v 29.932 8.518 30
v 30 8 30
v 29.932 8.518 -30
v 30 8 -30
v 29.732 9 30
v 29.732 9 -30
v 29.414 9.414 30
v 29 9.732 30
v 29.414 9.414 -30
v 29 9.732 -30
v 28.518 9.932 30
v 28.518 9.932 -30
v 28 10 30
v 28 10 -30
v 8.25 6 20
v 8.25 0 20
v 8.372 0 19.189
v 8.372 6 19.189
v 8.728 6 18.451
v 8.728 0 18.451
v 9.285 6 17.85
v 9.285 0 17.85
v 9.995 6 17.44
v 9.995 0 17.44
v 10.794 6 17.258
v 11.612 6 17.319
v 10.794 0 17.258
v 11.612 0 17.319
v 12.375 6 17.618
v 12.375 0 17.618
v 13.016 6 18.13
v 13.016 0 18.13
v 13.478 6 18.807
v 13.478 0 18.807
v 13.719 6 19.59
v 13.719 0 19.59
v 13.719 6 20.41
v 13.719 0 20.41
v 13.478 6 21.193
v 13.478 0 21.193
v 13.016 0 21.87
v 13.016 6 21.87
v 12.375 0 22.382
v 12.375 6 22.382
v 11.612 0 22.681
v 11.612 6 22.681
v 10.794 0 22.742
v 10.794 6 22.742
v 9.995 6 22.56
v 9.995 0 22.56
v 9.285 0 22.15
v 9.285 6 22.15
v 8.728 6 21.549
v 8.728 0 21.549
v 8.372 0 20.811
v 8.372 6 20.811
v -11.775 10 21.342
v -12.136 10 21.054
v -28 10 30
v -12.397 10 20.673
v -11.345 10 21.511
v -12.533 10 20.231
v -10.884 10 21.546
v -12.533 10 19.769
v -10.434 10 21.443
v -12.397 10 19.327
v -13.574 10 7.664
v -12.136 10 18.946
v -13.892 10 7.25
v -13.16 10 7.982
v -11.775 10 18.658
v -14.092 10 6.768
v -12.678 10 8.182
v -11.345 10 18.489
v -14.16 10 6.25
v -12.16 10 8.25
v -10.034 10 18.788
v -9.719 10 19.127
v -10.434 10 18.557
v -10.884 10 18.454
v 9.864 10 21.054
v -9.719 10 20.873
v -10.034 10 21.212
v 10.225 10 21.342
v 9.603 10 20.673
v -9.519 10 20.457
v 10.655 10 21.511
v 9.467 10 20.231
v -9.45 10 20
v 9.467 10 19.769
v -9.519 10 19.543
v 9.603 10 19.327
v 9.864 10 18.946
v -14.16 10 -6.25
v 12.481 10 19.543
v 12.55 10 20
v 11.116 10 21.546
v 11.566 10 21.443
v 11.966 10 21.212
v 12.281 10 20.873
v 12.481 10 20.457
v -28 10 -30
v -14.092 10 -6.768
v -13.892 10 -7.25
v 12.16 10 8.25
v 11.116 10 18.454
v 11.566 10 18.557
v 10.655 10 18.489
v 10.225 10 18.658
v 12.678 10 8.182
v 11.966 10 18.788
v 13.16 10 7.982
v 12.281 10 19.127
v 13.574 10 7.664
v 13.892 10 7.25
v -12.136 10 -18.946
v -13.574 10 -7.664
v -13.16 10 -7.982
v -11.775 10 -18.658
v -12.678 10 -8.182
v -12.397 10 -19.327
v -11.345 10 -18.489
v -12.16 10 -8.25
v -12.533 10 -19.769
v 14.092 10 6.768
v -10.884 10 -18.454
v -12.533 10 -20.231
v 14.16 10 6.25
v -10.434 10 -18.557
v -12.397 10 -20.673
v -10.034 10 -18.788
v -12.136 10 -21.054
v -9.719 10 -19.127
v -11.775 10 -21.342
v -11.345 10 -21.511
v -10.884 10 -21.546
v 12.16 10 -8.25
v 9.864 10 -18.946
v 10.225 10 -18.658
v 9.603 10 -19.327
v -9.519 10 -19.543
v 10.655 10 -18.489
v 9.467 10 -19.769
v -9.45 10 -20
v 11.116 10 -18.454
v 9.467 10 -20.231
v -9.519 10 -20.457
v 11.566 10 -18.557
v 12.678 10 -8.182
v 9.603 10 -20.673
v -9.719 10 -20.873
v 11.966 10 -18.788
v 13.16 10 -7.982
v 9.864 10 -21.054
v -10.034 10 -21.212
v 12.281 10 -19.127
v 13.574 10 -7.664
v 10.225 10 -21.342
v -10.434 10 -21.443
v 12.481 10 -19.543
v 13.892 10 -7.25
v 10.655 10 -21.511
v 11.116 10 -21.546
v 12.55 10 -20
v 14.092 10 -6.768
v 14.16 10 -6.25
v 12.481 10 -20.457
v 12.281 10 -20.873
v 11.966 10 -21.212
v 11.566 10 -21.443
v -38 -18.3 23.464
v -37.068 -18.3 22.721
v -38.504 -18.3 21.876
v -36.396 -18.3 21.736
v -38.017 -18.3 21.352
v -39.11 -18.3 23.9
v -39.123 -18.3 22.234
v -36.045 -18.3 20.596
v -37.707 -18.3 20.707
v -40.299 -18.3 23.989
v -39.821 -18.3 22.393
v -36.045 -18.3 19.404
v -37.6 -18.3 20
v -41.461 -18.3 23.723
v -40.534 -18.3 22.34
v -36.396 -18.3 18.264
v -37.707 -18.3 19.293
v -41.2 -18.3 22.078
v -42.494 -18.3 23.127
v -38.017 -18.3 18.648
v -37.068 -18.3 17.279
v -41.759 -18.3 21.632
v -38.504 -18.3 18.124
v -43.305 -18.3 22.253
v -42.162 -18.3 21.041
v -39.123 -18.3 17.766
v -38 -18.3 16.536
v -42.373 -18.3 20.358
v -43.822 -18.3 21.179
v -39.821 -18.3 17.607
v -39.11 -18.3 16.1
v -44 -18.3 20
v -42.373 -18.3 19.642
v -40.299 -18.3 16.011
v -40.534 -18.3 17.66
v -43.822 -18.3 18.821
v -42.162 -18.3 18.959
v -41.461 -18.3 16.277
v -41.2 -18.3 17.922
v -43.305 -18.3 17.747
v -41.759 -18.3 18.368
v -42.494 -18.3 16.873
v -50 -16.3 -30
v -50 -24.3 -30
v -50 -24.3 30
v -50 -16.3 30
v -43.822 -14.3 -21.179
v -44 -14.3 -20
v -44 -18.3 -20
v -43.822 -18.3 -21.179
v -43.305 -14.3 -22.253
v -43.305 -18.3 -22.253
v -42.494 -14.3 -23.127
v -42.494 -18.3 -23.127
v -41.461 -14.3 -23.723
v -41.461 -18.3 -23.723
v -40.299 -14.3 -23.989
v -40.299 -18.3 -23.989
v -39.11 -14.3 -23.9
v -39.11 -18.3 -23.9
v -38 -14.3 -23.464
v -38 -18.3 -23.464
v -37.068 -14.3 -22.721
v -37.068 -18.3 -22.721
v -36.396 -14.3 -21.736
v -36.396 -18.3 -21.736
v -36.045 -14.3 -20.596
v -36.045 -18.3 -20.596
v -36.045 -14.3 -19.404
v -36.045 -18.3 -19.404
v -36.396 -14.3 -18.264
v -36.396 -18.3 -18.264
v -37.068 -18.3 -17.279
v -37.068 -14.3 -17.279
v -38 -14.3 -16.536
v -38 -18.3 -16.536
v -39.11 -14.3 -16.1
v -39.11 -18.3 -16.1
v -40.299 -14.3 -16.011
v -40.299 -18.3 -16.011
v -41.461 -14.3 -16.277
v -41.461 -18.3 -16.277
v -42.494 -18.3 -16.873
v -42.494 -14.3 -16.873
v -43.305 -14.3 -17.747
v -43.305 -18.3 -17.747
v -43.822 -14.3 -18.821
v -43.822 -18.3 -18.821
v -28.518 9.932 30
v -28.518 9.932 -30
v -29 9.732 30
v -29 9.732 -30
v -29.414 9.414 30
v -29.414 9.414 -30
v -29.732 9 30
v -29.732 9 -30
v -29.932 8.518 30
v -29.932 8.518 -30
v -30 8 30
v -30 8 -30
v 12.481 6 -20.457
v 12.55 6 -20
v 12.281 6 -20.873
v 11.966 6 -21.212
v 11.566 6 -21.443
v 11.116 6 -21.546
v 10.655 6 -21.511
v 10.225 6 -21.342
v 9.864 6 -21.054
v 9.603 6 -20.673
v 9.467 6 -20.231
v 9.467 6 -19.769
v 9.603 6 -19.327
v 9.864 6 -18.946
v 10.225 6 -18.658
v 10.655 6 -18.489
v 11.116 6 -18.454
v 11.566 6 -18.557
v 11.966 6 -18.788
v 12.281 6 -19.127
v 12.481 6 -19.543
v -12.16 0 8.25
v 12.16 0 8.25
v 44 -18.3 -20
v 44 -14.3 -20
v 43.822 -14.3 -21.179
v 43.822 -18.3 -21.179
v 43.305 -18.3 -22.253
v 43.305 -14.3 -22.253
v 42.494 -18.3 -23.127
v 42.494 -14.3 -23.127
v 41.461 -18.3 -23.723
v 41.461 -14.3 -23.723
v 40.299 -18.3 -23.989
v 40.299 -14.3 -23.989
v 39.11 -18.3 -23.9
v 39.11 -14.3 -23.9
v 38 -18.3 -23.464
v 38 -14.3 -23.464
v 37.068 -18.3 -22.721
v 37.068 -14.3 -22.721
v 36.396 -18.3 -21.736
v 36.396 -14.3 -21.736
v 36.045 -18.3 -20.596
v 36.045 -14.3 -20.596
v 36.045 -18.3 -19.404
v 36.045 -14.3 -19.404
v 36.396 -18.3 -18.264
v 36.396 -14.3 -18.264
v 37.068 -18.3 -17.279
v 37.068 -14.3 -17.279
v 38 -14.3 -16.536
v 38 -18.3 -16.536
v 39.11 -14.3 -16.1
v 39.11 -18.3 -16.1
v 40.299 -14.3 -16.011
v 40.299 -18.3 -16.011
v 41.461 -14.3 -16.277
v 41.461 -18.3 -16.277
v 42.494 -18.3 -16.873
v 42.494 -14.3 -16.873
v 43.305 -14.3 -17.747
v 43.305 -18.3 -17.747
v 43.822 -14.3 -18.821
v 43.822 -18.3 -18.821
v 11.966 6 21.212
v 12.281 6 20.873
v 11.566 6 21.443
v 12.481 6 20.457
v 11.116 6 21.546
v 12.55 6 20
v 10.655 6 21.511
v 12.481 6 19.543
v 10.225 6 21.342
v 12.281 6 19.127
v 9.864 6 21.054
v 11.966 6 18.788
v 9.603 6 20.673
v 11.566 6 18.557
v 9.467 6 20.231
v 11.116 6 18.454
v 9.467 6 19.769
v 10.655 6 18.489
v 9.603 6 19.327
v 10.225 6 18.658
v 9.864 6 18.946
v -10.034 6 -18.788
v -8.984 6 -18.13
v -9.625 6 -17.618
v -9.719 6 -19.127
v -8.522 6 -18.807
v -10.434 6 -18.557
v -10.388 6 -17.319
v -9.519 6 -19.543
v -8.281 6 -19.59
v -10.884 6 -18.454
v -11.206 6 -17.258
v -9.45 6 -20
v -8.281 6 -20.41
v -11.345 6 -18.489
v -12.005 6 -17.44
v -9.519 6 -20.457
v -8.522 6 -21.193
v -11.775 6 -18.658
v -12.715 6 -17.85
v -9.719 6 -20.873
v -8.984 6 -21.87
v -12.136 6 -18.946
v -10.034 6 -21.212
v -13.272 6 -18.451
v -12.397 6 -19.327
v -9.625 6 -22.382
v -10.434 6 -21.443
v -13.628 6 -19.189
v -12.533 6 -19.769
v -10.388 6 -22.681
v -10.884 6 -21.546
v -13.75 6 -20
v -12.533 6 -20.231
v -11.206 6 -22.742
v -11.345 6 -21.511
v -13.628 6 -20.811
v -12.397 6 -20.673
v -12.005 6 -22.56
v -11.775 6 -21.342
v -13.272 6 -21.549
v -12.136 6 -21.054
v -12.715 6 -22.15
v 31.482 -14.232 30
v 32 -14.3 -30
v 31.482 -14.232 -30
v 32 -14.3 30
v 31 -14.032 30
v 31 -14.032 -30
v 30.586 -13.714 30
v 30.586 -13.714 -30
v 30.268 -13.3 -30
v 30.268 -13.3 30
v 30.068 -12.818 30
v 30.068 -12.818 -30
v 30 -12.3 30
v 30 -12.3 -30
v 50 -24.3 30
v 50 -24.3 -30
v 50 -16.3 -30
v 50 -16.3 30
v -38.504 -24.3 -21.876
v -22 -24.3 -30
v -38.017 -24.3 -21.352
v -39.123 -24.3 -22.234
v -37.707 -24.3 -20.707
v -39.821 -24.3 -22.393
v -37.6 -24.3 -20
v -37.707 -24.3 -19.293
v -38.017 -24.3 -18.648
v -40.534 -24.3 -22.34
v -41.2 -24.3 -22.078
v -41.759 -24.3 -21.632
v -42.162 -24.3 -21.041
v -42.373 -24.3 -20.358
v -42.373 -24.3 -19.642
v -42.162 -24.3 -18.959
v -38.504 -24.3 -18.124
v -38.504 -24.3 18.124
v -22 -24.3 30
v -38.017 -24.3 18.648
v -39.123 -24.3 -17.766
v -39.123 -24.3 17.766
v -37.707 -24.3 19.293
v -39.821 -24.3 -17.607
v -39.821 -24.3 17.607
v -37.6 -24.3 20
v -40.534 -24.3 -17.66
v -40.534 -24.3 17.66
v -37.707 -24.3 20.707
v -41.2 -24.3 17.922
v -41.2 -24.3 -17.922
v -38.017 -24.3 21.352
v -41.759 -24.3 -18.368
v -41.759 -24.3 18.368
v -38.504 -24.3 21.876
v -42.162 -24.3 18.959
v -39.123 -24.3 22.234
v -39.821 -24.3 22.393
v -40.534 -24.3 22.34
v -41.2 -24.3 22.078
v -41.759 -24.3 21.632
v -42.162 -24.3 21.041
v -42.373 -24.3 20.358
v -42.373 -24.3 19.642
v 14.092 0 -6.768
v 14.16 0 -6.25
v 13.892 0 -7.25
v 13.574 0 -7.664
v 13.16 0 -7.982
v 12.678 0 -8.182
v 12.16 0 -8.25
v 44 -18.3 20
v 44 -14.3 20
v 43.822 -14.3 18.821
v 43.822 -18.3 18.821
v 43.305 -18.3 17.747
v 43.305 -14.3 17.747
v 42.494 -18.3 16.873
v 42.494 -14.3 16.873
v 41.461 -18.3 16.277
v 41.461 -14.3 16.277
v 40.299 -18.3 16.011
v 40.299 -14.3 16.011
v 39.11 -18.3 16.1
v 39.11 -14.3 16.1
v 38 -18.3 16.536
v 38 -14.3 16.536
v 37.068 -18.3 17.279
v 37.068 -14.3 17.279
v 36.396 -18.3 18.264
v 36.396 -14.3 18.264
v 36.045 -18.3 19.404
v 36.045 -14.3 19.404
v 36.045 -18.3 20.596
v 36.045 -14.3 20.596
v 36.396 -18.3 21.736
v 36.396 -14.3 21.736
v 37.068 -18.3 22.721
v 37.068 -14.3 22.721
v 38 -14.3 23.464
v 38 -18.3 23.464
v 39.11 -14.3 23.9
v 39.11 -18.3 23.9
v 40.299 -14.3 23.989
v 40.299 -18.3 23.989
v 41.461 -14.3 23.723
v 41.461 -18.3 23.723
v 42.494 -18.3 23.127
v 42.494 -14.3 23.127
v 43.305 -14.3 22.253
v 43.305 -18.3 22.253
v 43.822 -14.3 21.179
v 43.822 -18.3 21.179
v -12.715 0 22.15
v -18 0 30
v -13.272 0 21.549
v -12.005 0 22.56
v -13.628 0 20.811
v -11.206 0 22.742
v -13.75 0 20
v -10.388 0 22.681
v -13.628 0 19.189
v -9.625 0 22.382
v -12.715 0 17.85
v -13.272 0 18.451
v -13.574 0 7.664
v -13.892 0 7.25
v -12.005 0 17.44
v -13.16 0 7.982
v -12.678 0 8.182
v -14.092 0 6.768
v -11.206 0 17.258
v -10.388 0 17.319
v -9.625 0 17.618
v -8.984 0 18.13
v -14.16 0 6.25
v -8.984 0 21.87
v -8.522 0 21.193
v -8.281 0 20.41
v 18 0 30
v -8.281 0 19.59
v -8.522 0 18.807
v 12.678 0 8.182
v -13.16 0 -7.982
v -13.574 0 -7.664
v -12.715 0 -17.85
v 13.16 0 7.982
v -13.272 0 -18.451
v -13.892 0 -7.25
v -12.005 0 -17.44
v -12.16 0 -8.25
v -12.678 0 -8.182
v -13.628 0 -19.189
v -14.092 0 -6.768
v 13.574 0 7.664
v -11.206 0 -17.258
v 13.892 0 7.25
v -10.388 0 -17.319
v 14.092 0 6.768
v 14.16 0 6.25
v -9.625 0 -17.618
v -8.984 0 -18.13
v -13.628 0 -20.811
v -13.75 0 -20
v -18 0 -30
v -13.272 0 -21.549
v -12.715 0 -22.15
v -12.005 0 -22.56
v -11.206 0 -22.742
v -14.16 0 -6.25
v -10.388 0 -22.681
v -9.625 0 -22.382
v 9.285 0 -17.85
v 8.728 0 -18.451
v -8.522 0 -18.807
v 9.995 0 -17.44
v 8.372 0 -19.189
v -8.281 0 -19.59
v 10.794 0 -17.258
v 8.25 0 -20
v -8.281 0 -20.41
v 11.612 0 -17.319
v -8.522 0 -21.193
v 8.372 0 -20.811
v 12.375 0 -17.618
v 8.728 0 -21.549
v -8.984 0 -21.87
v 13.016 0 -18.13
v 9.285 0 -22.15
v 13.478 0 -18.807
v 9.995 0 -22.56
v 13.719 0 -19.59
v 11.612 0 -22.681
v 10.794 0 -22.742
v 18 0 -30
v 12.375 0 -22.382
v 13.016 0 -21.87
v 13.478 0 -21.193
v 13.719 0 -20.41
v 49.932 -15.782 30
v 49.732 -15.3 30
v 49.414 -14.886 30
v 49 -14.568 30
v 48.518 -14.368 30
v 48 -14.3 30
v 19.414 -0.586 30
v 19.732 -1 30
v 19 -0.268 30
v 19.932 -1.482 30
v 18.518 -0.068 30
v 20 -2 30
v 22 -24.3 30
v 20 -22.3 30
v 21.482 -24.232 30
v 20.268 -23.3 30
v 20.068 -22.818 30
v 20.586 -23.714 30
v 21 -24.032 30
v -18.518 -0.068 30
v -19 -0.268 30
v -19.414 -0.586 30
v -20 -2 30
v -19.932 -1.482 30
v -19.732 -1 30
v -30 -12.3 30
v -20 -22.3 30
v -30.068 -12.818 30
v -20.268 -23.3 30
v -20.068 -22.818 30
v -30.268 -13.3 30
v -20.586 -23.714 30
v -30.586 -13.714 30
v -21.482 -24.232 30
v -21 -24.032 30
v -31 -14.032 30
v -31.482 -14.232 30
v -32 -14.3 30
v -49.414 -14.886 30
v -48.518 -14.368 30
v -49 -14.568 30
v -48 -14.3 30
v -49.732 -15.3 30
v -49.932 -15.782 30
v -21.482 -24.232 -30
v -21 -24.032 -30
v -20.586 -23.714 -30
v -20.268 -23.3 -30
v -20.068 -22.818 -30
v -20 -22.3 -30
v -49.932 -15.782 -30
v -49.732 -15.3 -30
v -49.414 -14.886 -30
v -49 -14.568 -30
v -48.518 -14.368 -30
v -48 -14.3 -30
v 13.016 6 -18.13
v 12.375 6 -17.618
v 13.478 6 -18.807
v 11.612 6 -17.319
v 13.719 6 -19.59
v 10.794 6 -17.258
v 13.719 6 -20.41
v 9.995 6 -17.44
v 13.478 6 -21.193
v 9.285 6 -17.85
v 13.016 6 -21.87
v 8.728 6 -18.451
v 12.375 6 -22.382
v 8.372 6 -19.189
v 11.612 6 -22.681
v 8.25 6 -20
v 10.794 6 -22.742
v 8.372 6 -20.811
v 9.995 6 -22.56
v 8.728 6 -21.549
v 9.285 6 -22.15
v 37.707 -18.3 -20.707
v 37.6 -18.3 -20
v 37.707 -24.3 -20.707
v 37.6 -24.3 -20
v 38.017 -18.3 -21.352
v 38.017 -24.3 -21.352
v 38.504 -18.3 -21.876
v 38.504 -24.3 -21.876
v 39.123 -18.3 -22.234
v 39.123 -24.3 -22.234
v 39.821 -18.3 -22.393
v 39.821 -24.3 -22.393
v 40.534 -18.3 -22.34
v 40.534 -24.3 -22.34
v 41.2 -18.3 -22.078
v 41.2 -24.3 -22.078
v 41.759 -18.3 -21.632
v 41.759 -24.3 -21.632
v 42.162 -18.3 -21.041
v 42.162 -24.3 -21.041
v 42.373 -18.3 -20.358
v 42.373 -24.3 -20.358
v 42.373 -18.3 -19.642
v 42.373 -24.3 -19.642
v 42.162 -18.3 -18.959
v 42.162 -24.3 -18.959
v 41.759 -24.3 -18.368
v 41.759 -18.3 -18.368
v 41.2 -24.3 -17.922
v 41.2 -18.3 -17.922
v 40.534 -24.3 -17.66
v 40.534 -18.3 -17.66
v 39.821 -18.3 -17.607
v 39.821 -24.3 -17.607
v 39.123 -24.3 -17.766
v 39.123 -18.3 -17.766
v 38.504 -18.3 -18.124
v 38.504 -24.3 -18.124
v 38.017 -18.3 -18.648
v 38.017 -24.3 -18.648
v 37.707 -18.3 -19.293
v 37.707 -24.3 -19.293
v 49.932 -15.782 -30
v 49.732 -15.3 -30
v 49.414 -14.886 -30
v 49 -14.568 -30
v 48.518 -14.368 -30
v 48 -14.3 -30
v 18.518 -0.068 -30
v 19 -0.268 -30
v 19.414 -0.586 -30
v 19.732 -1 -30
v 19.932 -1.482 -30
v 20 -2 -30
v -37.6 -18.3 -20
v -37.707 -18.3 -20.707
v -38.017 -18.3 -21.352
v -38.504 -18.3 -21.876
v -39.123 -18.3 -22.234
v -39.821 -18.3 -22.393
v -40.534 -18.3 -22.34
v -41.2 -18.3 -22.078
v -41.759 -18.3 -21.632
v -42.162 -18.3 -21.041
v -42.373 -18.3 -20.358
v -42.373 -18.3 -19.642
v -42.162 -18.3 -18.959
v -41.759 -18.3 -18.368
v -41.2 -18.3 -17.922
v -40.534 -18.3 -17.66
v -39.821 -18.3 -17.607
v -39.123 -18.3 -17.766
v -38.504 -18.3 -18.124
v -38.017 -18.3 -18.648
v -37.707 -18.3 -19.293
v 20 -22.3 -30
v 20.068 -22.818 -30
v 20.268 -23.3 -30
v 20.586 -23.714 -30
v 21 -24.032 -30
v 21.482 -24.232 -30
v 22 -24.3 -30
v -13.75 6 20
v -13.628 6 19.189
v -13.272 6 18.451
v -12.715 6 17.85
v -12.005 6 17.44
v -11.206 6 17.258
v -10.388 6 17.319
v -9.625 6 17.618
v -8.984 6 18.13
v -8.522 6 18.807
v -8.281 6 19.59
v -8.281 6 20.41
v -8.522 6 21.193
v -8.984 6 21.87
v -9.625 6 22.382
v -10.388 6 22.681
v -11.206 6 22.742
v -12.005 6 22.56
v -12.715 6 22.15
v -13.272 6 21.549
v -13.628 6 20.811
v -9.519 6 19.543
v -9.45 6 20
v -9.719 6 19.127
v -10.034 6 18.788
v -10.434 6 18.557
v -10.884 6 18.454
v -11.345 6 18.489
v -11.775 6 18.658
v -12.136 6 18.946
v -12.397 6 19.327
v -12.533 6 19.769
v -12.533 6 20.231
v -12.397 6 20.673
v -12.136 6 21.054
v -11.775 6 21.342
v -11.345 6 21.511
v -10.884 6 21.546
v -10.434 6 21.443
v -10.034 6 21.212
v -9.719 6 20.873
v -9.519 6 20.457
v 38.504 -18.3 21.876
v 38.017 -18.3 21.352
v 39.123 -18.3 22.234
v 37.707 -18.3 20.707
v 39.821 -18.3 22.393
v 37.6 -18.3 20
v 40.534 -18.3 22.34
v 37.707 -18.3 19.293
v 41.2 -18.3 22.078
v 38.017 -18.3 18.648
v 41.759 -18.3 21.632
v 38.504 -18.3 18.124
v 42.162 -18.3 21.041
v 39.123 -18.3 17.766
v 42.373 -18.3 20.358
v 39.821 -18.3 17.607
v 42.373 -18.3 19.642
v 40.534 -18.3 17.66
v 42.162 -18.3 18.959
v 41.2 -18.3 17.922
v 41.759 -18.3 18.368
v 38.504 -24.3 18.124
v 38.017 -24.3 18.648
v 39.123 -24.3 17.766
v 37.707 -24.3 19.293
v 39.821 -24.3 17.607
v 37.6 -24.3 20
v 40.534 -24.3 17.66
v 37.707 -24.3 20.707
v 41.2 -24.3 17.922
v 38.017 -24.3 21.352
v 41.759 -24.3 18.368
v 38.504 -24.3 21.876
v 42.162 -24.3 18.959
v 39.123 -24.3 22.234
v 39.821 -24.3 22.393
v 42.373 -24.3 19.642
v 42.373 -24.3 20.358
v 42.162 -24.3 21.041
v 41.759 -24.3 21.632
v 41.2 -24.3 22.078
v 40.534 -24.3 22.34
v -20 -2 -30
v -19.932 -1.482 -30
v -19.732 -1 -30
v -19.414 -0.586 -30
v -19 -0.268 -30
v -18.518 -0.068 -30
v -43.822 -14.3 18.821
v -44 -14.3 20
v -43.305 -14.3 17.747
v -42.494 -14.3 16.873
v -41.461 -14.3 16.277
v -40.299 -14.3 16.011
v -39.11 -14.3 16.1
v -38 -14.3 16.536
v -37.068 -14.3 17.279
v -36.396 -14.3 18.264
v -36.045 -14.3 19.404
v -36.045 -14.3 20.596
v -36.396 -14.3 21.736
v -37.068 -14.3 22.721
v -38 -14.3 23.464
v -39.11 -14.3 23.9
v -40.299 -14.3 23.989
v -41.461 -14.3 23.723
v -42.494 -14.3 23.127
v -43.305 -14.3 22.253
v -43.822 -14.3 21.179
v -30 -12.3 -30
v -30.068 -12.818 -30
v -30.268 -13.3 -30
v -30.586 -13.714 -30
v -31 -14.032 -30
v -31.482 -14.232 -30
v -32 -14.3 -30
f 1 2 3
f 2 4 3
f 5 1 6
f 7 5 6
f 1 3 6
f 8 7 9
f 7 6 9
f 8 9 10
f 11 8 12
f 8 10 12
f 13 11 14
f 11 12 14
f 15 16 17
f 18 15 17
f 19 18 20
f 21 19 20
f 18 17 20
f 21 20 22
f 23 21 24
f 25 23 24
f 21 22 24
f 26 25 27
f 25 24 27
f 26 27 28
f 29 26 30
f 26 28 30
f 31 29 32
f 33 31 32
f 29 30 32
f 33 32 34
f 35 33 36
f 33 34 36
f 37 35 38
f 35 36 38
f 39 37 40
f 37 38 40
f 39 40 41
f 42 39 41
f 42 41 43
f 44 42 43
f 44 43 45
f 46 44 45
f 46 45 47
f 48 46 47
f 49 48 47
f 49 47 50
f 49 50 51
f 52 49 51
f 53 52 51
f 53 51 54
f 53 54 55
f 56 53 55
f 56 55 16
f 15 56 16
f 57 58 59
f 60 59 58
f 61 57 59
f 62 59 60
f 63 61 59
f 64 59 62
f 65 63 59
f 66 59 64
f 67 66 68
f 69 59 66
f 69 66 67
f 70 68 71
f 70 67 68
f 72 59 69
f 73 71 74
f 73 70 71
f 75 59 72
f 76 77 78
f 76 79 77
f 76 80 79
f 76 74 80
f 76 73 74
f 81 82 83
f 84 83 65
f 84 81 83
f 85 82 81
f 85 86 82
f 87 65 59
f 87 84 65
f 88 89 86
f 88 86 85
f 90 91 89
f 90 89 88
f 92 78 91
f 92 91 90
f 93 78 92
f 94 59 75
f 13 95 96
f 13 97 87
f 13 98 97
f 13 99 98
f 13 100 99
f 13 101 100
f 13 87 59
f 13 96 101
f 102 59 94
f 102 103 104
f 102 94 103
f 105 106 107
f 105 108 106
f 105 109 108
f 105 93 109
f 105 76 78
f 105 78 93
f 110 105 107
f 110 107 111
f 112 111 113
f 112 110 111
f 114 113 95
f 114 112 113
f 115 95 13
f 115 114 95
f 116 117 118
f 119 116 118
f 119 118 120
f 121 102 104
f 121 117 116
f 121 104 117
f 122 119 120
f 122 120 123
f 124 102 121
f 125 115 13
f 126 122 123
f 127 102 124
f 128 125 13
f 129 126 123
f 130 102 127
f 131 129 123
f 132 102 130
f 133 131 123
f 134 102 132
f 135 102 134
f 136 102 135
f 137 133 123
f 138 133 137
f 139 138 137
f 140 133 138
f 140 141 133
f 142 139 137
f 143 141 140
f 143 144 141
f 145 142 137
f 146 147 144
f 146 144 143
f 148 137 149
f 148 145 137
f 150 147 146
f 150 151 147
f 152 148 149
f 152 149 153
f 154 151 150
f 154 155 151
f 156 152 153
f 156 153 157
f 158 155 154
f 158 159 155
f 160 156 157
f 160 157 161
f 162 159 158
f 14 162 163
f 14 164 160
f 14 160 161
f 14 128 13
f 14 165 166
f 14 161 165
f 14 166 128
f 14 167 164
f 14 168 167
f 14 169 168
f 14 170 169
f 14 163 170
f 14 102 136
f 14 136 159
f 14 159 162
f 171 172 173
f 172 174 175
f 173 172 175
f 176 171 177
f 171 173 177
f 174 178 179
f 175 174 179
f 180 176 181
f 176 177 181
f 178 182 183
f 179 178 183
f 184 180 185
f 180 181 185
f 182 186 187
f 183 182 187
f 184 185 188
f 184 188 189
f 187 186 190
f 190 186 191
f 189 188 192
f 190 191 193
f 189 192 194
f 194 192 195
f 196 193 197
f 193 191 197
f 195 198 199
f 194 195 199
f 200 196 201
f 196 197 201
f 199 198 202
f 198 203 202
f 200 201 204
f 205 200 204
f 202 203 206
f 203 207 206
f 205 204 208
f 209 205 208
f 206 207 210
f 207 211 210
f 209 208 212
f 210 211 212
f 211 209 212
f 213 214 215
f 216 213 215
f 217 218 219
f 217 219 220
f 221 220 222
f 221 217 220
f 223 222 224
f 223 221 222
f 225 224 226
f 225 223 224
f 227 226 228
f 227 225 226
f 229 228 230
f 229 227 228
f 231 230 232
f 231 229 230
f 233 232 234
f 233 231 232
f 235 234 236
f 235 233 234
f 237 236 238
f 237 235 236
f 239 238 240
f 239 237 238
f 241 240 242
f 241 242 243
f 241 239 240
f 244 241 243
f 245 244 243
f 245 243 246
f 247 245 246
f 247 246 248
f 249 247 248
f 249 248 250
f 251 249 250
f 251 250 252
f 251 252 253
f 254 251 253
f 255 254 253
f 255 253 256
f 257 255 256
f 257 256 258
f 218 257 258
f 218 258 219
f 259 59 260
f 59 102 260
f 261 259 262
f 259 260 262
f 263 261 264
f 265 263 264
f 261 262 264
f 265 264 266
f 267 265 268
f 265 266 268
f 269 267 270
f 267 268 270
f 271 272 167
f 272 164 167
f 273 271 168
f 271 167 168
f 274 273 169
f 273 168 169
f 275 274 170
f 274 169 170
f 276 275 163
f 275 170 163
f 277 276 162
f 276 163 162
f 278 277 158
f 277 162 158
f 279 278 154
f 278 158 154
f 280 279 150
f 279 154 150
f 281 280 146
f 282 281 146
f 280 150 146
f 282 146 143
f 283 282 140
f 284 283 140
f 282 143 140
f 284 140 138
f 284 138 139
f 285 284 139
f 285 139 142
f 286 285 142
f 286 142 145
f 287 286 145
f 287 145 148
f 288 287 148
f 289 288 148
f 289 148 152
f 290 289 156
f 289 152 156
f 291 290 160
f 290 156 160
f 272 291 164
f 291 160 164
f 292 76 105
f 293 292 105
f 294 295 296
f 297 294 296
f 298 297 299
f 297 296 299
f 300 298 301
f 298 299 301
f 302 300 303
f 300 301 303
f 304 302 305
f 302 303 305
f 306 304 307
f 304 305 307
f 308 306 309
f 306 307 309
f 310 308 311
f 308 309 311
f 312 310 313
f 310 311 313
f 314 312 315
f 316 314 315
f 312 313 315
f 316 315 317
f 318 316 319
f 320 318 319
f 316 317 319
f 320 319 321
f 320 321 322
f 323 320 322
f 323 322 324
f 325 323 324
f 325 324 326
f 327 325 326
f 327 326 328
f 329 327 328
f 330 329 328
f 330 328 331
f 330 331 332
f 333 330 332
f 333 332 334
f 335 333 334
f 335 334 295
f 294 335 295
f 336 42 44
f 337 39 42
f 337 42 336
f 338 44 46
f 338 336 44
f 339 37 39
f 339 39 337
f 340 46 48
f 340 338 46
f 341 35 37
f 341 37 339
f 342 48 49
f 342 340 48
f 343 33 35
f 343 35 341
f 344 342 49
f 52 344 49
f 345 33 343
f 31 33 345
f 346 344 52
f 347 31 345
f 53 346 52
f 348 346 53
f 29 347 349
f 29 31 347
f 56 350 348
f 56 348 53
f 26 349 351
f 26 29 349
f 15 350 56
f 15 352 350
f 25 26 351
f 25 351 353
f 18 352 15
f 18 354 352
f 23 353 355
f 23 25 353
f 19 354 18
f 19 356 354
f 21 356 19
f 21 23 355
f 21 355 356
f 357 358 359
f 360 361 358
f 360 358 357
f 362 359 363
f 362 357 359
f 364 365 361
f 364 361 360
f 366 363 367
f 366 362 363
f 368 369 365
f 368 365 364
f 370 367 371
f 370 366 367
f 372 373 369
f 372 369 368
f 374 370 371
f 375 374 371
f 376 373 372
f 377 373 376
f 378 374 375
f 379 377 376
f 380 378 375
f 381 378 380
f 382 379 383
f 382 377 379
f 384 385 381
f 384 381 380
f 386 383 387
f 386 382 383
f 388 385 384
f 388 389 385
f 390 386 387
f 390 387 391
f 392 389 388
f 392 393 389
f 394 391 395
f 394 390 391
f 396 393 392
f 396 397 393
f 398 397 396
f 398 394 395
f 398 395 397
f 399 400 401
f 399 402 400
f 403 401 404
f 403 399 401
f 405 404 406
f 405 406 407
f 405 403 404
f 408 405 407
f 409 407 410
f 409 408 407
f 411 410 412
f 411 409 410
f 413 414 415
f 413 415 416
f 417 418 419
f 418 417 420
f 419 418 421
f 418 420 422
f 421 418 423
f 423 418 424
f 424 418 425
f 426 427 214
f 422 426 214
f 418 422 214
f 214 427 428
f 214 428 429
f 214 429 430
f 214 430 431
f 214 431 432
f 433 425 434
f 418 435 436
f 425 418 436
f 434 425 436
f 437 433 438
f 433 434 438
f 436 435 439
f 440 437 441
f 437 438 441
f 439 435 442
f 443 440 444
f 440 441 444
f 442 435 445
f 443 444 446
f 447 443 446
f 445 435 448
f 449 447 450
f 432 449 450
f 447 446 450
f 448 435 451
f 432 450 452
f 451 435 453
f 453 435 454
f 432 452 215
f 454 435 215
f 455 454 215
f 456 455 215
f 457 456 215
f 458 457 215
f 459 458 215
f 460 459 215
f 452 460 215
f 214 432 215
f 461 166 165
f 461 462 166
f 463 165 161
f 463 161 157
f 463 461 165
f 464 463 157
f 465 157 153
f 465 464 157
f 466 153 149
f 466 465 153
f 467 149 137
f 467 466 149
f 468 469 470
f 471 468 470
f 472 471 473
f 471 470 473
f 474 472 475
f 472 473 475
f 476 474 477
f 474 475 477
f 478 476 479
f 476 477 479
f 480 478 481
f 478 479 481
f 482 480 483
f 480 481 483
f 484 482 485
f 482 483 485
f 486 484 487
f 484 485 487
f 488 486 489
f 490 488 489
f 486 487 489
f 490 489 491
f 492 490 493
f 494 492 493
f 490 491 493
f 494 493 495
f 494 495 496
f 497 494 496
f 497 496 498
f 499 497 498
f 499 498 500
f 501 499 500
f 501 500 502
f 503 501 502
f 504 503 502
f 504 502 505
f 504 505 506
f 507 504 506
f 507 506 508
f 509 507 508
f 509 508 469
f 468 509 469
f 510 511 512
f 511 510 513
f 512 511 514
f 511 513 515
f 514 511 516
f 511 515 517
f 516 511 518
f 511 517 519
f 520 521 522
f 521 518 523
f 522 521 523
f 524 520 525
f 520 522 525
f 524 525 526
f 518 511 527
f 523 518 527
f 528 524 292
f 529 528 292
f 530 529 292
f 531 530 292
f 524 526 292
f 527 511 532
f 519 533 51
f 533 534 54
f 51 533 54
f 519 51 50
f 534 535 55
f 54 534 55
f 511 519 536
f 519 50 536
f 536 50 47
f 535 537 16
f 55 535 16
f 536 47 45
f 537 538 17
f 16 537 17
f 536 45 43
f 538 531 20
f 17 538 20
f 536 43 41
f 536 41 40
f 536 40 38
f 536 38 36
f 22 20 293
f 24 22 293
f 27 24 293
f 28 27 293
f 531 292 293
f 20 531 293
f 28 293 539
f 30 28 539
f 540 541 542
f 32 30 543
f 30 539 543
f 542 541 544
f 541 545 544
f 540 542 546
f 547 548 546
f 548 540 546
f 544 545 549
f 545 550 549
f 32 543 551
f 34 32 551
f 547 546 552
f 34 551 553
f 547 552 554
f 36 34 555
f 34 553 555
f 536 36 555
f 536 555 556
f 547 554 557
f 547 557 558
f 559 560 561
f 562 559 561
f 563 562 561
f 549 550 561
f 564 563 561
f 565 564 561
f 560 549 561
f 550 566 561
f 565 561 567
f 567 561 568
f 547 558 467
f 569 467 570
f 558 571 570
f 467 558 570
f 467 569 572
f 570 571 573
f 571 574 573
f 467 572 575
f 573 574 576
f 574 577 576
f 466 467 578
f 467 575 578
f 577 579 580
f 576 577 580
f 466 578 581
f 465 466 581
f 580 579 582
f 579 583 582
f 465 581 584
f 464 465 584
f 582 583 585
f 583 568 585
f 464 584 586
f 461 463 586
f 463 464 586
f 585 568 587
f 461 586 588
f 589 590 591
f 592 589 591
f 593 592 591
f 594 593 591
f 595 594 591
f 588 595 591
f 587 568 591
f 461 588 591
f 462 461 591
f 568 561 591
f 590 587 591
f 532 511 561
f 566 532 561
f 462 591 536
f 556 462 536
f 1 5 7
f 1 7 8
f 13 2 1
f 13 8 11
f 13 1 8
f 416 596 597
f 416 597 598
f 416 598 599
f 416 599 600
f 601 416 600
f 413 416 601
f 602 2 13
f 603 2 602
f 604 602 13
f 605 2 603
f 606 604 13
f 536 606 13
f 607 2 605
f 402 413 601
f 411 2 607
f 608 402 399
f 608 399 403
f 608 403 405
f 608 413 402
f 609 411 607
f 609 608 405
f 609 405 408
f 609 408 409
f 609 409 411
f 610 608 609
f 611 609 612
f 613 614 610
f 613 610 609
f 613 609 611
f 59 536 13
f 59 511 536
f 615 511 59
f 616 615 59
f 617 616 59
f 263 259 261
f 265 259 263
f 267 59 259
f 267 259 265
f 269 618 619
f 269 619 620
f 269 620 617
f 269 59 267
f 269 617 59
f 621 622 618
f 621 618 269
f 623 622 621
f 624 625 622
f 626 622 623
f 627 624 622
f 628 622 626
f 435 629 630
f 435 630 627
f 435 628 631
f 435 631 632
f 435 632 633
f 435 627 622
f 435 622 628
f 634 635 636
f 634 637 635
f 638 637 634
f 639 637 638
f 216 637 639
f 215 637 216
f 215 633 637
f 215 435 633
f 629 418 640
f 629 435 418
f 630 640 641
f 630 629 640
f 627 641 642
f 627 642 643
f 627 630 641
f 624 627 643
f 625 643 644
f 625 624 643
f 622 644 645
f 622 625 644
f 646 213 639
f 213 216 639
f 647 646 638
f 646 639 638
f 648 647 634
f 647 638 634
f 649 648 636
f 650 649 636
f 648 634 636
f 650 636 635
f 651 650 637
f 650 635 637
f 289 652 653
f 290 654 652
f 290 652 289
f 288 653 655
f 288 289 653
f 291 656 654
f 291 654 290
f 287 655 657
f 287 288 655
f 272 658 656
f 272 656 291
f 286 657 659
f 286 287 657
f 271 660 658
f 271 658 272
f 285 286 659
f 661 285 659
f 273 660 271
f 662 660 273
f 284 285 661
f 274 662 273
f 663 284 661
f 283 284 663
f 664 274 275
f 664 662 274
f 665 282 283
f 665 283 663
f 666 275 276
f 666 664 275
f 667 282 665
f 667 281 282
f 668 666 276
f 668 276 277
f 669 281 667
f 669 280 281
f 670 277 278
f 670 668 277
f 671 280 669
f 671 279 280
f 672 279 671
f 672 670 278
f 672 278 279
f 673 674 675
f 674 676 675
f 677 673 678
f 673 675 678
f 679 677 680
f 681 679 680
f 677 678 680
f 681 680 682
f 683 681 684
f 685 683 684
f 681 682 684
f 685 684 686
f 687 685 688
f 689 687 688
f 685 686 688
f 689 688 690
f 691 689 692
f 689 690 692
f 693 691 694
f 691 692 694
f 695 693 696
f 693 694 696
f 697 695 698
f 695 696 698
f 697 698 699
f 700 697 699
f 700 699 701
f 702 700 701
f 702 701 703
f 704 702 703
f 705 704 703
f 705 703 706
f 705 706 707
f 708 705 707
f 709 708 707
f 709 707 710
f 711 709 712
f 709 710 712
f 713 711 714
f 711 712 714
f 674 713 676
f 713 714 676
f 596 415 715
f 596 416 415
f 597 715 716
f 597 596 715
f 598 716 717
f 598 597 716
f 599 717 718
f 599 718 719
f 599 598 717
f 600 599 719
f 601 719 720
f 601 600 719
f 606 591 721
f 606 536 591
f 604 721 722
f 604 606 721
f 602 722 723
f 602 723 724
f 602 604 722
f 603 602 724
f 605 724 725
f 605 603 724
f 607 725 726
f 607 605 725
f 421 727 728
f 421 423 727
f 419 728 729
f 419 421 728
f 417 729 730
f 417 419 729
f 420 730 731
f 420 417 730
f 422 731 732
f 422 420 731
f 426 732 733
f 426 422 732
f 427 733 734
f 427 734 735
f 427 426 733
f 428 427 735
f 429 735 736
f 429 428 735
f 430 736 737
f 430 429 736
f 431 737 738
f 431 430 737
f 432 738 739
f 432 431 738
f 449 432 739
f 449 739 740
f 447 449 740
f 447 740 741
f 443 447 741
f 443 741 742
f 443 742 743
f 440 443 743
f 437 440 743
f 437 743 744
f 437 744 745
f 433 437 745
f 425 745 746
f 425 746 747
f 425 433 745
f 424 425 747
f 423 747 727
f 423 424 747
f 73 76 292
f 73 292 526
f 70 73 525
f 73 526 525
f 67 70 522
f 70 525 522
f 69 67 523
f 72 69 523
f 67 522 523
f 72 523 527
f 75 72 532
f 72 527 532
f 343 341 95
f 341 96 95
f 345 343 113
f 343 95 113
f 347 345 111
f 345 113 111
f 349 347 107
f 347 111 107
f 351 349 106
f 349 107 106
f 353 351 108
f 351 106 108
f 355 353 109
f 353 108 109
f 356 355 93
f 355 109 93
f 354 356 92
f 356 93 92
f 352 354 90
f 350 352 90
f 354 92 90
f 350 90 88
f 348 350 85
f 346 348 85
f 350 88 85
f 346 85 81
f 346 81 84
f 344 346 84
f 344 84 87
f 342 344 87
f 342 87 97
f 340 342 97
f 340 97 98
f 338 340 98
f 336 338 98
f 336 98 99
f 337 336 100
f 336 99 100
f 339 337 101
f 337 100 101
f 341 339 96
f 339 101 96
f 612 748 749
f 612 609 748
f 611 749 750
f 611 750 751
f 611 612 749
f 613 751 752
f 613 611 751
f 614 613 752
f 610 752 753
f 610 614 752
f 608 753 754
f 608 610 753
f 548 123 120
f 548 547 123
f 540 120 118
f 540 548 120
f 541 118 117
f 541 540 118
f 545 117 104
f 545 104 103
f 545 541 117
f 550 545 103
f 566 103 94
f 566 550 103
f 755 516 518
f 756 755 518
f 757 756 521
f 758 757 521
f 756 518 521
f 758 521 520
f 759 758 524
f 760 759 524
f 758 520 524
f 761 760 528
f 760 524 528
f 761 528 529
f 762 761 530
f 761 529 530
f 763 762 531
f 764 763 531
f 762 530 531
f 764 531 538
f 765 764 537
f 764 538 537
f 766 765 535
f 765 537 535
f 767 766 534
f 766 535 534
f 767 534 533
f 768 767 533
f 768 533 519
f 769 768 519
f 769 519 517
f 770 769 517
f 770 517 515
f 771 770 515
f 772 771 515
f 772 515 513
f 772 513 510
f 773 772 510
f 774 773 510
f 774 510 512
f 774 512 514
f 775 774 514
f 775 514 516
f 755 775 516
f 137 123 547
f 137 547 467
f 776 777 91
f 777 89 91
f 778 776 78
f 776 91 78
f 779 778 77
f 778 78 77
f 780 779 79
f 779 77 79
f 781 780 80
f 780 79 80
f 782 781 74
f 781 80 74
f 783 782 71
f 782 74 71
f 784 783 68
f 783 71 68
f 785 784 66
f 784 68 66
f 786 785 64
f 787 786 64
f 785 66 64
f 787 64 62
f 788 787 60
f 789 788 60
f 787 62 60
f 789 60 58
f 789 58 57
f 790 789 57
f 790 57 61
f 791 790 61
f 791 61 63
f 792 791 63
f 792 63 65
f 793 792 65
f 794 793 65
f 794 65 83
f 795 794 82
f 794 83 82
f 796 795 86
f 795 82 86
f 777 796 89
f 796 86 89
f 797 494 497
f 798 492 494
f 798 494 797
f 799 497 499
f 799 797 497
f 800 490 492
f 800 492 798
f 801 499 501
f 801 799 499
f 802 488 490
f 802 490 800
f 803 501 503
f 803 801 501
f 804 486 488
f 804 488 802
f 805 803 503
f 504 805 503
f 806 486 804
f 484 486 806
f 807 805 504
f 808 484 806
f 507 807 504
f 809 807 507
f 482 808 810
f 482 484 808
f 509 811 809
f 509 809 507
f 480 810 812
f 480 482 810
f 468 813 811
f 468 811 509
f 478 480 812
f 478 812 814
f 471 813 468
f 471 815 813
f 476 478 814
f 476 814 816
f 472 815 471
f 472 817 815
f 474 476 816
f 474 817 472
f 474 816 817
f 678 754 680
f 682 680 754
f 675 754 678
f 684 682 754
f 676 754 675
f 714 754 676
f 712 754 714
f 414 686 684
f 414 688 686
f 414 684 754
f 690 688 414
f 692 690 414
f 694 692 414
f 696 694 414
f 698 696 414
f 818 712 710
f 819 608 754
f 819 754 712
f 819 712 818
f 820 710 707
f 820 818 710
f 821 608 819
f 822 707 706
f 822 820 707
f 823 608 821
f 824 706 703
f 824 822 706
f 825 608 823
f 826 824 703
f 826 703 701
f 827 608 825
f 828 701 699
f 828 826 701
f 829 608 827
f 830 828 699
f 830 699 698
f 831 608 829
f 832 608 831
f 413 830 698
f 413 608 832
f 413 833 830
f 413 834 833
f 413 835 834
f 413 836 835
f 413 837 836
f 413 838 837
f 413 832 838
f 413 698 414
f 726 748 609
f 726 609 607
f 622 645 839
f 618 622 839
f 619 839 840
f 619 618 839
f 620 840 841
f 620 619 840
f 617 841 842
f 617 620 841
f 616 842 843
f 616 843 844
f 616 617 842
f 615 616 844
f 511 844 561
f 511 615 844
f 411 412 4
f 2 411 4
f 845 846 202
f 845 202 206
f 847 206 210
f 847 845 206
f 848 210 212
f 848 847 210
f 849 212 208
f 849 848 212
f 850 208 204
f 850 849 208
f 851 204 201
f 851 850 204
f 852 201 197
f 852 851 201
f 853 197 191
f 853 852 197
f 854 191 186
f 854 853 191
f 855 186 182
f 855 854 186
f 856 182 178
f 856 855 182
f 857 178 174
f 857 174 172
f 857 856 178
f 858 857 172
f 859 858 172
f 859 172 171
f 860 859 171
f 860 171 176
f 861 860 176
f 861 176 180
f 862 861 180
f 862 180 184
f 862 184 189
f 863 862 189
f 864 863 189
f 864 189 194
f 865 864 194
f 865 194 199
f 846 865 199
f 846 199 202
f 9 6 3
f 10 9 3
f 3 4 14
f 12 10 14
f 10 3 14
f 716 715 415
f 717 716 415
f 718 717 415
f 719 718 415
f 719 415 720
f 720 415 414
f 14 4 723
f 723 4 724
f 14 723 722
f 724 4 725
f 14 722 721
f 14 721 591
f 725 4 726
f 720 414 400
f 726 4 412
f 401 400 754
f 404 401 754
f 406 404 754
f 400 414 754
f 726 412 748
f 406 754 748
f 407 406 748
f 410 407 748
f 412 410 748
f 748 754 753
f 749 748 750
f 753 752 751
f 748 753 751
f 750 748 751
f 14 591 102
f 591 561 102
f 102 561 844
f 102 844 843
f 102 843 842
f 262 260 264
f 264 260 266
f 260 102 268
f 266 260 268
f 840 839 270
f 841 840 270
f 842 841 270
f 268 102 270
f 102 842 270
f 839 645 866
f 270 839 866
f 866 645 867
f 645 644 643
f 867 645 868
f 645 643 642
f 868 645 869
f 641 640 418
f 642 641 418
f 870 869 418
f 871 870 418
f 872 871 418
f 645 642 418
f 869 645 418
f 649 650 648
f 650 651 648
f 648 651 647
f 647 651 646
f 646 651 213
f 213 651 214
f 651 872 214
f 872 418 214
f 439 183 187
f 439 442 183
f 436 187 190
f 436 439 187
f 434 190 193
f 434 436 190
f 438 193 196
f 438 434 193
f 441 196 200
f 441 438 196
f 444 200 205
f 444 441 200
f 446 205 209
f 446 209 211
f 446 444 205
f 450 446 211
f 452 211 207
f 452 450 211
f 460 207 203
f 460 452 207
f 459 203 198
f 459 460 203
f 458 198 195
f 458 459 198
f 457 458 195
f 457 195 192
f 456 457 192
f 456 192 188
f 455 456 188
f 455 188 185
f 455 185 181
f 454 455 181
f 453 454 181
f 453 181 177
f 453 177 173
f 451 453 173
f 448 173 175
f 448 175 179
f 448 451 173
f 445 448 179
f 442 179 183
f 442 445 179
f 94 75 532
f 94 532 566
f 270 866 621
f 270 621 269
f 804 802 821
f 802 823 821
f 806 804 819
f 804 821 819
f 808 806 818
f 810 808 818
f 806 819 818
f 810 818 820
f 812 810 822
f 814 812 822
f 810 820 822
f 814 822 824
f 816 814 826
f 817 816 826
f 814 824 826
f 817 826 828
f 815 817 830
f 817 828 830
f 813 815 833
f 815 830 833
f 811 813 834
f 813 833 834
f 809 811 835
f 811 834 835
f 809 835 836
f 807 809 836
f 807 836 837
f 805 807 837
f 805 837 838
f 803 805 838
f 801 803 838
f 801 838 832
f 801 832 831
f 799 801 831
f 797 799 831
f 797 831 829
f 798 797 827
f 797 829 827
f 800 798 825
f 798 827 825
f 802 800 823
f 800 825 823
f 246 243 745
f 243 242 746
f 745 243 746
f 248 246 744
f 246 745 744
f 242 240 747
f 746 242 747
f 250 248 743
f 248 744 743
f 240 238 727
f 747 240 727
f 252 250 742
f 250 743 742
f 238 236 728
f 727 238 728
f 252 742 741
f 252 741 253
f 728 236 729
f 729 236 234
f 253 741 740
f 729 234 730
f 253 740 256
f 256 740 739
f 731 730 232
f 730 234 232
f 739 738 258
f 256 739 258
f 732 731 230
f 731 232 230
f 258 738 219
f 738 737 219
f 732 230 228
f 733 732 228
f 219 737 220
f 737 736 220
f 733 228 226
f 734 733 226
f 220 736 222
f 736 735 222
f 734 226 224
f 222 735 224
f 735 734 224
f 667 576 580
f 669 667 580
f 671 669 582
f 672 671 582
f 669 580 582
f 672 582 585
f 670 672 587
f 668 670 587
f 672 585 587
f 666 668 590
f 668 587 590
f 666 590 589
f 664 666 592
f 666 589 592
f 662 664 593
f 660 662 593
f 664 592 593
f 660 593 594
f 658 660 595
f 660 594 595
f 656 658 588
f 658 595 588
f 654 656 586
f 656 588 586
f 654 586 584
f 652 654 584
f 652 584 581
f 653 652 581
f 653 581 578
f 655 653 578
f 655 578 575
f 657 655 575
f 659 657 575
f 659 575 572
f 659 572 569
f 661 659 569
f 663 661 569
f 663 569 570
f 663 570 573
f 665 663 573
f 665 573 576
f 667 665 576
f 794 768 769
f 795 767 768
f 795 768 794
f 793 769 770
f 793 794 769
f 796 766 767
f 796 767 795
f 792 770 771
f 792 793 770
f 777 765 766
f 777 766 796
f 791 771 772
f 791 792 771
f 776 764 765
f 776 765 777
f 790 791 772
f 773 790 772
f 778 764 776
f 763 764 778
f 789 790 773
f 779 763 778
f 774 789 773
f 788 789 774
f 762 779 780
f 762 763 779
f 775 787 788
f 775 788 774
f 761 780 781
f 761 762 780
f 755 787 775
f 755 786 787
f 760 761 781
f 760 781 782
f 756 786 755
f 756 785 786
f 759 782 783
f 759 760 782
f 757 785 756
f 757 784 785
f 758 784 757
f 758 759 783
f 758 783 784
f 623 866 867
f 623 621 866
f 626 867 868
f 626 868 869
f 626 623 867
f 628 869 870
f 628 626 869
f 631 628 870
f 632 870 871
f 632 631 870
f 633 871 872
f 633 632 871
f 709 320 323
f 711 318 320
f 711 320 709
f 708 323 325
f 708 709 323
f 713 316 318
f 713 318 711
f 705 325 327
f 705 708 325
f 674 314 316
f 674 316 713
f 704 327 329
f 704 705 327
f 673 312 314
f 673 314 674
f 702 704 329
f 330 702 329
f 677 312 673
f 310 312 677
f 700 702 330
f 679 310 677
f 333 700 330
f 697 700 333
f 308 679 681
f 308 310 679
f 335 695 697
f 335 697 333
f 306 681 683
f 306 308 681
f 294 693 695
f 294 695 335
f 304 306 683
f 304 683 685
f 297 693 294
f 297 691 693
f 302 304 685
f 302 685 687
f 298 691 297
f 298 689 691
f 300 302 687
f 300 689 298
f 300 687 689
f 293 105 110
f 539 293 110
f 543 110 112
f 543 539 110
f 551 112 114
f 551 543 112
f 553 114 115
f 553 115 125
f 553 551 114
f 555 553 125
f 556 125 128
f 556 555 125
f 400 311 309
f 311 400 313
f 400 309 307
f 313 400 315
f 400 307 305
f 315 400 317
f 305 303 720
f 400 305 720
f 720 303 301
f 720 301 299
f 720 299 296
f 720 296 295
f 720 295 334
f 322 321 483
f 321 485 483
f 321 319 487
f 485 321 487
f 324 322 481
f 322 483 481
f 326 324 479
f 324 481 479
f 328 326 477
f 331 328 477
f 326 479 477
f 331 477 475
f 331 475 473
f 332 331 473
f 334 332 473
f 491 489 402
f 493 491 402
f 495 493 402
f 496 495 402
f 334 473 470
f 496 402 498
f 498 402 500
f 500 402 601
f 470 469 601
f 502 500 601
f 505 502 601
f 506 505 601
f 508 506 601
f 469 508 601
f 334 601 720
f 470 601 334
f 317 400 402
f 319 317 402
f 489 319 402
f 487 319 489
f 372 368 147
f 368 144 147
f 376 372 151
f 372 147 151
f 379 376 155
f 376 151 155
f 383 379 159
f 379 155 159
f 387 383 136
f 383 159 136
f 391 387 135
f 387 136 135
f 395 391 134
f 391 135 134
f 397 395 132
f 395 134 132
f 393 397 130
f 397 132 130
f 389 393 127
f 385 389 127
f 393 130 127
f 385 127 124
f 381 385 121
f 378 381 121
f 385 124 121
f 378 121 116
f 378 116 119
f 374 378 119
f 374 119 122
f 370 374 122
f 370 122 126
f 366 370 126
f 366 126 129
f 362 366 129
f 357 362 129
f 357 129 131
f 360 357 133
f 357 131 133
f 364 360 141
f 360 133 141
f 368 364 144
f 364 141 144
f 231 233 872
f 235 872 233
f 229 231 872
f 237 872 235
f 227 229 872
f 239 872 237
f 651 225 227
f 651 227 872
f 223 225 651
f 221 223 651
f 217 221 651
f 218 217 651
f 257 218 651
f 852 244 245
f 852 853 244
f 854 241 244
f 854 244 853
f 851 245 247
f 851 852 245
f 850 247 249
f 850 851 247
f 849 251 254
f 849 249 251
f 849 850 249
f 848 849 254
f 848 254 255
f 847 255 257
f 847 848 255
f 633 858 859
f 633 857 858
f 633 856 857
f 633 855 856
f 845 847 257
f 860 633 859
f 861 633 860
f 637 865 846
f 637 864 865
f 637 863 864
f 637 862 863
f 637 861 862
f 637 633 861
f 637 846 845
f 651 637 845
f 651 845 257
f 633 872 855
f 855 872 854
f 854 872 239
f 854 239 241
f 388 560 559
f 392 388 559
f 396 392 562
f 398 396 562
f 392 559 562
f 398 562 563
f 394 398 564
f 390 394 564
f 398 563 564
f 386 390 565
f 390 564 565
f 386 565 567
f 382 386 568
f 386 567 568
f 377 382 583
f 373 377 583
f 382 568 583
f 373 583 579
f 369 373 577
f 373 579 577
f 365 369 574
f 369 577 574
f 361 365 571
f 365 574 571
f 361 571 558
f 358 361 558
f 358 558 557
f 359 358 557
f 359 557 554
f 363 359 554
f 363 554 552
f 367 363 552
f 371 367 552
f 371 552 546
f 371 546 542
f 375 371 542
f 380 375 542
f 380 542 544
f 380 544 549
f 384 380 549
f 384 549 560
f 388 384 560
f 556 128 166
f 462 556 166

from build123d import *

# Parameters (mm, degrees)
SKETCH2_W                        = 60
SKETCH2_H                        = 60
BOSS_EXTRUDE1_DEPTH              = 10
SKETCH7_W                        = 28.32
SKETCH7_H                        = 16.5
CUT_EXTRUDE2_DEPTH               = 44.588989435
FILLET2_R                        = 2
CBORE_FOR_M2_5_SHCS2_D           = 3.1
CBORE_FOR_M2_5_SHCS2_CBORE_D     = 5.5
CBORE_FOR_M2_5_SHCS2_CBORE_DEPTH = 2.5
MOVE_FACE1_BY                    = 3.5
MOVE_FACE1_2_BY                  = 3.5
MOVE_FACE1_3_BY                  = 3.5
MOVE_FACE1_4_BY                  = 3.5
SKETCH11_W                       = 10
SKETCH11_H                       = 24.3
BOSS_EXTRUDE2_DEPTH              = 60
SKETCH12_W                       = 20
SKETCH12_H                       = 60
BOSS_EXTRUDE3_DEPTH              = 10
CBORE_FOR_M4_SHCS1_D             = 4.8
CBORE_FOR_M4_SHCS1_CBORE_D       = 8
CBORE_FOR_M4_SHCS1_CBORE_DEPTH   = 4
FILLET5_R                        = 2


with BuildPart() as part:
    # Sketch2 → Boss-Extrude1 (new body)
    with BuildSketch(Plane(origin=(0, 0, 0), x_dir=(1, 0, 0), z_dir=(0, 1, 0))):
        Rectangle(SKETCH2_W, SKETCH2_H)
    extrude(amount=BOSS_EXTRUDE1_DEPTH)

    # Sketch7 → Cut-Extrude2 (cut, through all)
    with BuildSketch(Plane(origin=(0, 10, 0), x_dir=(1, 0, 0), z_dir=(0, 1, 0))):
        Rectangle(SKETCH7_W, SKETCH7_H)
    extrude(amount=-CUT_EXTRUDE2_DEPTH, mode=Mode.SUBTRACT)

    # Fillet2
    fillet2_edges = [part.edges().sort_by_distance(p)[0] for p in [
        (-14.16, 5, 8.25),
        (-14.16, 5, -8.25),
        (14.16, 5, -8.25),
        (14.16, 5, 8.25),
    ]]
    fillet(fillet2_edges, radius=FILLET2_R)

    # CBORE for M2.5 SHCS2 (through all)
    with Locations(Plane(origin=(0, 0, 0), x_dir=(-1, 0, 0), z_dir=(0, -1, 0))):
        with Locations((11, -20), (-11, -20), (11, 20), (-11, 20)):
            CounterBoreHole(CBORE_FOR_M2_5_SHCS2_D / 2, CBORE_FOR_M2_5_SHCS2_CBORE_D / 2, CBORE_FOR_M2_5_SHCS2_CBORE_DEPTH)

    # Move Face1: a face moved inward by 3.5
    extrude(part.faces().sort_by_distance((11, 2.5, 22.2))[0], amount=MOVE_FACE1_BY, dir=(0, 1, 0), mode=Mode.SUBTRACT)

    # Move Face1 2: a face moved inward by 3.5
    extrude(part.faces().sort_by_distance((-11, 2.5, 22.2))[0], amount=MOVE_FACE1_2_BY, dir=(0, 1, 0), mode=Mode.SUBTRACT)

    # Move Face1 3: a face moved inward by 3.5
    extrude(part.faces().sort_by_distance((11, 2.5, -17.8))[0], amount=MOVE_FACE1_3_BY, dir=(0, 1, 0), mode=Mode.SUBTRACT)

    # Move Face1 4: a face moved inward by 3.5
    extrude(part.faces().sort_by_distance((-11, 2.5, -17.8))[0], amount=MOVE_FACE1_4_BY, dir=(0, 1, 0), mode=Mode.SUBTRACT)

    # Sketch11 → Boss-Extrude2 (add)
    with BuildSketch(Plane(origin=(0, 0, -30), x_dir=(-1, 0, 0), z_dir=(0, 0, -1))):
        with Locations((-25, -12.15)):
            Rectangle(SKETCH11_W, SKETCH11_H)
    boss_extrude2 = extrude(amount=-BOSS_EXTRUDE2_DEPTH)

    # Sketch12 → Boss-Extrude3 (add)
    with BuildSketch(Plane.XZ.offset(24.3)):
        with Locations((40, 0)):
            Rectangle(SKETCH12_W, SKETCH12_H)
    boss_extrude3 = extrude(amount=-BOSS_EXTRUDE3_DEPTH)

    # CBORE for M4 SHCS1 (through all)
    with Locations(Plane(origin=(0, -14.3, 0), x_dir=(1, 0, 0), z_dir=(0, 1, 0))):
        with Locations((40, 20), (40, -20)):
            cbore_for_m4_shcs1 = CounterBoreHole(CBORE_FOR_M4_SHCS1_D / 2, CBORE_FOR_M4_SHCS1_CBORE_D / 2, CBORE_FOR_M4_SHCS1_CBORE_DEPTH)

    # Mirror1: Boss-Extrude2, Boss-Extrude3, CBORE for M4 SHCS1 across plane
    add(boss_extrude2.mirror(Plane(origin=(0, 0, 0), x_dir=(0, 0, 1), z_dir=(1, 0, 0))))
    add(boss_extrude3.mirror(Plane(origin=(0, 0, 0), x_dir=(0, 0, 1), z_dir=(1, 0, 0))))
    add(cbore_for_m4_shcs1.mirror(Plane(origin=(0, 0, 0), x_dir=(0, 0, 1), z_dir=(1, 0, 0))), mode=Mode.SUBTRACT)

    # Fillet5
    fillet5_edges = [part.edges().sort_by_distance(p)[0] for p in [
        (50, -14.3, 0),
        (30, -14.3, 0),
        (30, 10, 0),
        (-20, 0, 0),
        (-20, -24.3, 0),
        (-30, -14.3, 0),
        (-50, -14.3, 0),
        (-30, 10, 0),
        (20, 0, 0),
        (20, -24.3, 0),
    ]]
    fillet(fillet5_edges, radius=FILLET5_R)


solid = part.part
